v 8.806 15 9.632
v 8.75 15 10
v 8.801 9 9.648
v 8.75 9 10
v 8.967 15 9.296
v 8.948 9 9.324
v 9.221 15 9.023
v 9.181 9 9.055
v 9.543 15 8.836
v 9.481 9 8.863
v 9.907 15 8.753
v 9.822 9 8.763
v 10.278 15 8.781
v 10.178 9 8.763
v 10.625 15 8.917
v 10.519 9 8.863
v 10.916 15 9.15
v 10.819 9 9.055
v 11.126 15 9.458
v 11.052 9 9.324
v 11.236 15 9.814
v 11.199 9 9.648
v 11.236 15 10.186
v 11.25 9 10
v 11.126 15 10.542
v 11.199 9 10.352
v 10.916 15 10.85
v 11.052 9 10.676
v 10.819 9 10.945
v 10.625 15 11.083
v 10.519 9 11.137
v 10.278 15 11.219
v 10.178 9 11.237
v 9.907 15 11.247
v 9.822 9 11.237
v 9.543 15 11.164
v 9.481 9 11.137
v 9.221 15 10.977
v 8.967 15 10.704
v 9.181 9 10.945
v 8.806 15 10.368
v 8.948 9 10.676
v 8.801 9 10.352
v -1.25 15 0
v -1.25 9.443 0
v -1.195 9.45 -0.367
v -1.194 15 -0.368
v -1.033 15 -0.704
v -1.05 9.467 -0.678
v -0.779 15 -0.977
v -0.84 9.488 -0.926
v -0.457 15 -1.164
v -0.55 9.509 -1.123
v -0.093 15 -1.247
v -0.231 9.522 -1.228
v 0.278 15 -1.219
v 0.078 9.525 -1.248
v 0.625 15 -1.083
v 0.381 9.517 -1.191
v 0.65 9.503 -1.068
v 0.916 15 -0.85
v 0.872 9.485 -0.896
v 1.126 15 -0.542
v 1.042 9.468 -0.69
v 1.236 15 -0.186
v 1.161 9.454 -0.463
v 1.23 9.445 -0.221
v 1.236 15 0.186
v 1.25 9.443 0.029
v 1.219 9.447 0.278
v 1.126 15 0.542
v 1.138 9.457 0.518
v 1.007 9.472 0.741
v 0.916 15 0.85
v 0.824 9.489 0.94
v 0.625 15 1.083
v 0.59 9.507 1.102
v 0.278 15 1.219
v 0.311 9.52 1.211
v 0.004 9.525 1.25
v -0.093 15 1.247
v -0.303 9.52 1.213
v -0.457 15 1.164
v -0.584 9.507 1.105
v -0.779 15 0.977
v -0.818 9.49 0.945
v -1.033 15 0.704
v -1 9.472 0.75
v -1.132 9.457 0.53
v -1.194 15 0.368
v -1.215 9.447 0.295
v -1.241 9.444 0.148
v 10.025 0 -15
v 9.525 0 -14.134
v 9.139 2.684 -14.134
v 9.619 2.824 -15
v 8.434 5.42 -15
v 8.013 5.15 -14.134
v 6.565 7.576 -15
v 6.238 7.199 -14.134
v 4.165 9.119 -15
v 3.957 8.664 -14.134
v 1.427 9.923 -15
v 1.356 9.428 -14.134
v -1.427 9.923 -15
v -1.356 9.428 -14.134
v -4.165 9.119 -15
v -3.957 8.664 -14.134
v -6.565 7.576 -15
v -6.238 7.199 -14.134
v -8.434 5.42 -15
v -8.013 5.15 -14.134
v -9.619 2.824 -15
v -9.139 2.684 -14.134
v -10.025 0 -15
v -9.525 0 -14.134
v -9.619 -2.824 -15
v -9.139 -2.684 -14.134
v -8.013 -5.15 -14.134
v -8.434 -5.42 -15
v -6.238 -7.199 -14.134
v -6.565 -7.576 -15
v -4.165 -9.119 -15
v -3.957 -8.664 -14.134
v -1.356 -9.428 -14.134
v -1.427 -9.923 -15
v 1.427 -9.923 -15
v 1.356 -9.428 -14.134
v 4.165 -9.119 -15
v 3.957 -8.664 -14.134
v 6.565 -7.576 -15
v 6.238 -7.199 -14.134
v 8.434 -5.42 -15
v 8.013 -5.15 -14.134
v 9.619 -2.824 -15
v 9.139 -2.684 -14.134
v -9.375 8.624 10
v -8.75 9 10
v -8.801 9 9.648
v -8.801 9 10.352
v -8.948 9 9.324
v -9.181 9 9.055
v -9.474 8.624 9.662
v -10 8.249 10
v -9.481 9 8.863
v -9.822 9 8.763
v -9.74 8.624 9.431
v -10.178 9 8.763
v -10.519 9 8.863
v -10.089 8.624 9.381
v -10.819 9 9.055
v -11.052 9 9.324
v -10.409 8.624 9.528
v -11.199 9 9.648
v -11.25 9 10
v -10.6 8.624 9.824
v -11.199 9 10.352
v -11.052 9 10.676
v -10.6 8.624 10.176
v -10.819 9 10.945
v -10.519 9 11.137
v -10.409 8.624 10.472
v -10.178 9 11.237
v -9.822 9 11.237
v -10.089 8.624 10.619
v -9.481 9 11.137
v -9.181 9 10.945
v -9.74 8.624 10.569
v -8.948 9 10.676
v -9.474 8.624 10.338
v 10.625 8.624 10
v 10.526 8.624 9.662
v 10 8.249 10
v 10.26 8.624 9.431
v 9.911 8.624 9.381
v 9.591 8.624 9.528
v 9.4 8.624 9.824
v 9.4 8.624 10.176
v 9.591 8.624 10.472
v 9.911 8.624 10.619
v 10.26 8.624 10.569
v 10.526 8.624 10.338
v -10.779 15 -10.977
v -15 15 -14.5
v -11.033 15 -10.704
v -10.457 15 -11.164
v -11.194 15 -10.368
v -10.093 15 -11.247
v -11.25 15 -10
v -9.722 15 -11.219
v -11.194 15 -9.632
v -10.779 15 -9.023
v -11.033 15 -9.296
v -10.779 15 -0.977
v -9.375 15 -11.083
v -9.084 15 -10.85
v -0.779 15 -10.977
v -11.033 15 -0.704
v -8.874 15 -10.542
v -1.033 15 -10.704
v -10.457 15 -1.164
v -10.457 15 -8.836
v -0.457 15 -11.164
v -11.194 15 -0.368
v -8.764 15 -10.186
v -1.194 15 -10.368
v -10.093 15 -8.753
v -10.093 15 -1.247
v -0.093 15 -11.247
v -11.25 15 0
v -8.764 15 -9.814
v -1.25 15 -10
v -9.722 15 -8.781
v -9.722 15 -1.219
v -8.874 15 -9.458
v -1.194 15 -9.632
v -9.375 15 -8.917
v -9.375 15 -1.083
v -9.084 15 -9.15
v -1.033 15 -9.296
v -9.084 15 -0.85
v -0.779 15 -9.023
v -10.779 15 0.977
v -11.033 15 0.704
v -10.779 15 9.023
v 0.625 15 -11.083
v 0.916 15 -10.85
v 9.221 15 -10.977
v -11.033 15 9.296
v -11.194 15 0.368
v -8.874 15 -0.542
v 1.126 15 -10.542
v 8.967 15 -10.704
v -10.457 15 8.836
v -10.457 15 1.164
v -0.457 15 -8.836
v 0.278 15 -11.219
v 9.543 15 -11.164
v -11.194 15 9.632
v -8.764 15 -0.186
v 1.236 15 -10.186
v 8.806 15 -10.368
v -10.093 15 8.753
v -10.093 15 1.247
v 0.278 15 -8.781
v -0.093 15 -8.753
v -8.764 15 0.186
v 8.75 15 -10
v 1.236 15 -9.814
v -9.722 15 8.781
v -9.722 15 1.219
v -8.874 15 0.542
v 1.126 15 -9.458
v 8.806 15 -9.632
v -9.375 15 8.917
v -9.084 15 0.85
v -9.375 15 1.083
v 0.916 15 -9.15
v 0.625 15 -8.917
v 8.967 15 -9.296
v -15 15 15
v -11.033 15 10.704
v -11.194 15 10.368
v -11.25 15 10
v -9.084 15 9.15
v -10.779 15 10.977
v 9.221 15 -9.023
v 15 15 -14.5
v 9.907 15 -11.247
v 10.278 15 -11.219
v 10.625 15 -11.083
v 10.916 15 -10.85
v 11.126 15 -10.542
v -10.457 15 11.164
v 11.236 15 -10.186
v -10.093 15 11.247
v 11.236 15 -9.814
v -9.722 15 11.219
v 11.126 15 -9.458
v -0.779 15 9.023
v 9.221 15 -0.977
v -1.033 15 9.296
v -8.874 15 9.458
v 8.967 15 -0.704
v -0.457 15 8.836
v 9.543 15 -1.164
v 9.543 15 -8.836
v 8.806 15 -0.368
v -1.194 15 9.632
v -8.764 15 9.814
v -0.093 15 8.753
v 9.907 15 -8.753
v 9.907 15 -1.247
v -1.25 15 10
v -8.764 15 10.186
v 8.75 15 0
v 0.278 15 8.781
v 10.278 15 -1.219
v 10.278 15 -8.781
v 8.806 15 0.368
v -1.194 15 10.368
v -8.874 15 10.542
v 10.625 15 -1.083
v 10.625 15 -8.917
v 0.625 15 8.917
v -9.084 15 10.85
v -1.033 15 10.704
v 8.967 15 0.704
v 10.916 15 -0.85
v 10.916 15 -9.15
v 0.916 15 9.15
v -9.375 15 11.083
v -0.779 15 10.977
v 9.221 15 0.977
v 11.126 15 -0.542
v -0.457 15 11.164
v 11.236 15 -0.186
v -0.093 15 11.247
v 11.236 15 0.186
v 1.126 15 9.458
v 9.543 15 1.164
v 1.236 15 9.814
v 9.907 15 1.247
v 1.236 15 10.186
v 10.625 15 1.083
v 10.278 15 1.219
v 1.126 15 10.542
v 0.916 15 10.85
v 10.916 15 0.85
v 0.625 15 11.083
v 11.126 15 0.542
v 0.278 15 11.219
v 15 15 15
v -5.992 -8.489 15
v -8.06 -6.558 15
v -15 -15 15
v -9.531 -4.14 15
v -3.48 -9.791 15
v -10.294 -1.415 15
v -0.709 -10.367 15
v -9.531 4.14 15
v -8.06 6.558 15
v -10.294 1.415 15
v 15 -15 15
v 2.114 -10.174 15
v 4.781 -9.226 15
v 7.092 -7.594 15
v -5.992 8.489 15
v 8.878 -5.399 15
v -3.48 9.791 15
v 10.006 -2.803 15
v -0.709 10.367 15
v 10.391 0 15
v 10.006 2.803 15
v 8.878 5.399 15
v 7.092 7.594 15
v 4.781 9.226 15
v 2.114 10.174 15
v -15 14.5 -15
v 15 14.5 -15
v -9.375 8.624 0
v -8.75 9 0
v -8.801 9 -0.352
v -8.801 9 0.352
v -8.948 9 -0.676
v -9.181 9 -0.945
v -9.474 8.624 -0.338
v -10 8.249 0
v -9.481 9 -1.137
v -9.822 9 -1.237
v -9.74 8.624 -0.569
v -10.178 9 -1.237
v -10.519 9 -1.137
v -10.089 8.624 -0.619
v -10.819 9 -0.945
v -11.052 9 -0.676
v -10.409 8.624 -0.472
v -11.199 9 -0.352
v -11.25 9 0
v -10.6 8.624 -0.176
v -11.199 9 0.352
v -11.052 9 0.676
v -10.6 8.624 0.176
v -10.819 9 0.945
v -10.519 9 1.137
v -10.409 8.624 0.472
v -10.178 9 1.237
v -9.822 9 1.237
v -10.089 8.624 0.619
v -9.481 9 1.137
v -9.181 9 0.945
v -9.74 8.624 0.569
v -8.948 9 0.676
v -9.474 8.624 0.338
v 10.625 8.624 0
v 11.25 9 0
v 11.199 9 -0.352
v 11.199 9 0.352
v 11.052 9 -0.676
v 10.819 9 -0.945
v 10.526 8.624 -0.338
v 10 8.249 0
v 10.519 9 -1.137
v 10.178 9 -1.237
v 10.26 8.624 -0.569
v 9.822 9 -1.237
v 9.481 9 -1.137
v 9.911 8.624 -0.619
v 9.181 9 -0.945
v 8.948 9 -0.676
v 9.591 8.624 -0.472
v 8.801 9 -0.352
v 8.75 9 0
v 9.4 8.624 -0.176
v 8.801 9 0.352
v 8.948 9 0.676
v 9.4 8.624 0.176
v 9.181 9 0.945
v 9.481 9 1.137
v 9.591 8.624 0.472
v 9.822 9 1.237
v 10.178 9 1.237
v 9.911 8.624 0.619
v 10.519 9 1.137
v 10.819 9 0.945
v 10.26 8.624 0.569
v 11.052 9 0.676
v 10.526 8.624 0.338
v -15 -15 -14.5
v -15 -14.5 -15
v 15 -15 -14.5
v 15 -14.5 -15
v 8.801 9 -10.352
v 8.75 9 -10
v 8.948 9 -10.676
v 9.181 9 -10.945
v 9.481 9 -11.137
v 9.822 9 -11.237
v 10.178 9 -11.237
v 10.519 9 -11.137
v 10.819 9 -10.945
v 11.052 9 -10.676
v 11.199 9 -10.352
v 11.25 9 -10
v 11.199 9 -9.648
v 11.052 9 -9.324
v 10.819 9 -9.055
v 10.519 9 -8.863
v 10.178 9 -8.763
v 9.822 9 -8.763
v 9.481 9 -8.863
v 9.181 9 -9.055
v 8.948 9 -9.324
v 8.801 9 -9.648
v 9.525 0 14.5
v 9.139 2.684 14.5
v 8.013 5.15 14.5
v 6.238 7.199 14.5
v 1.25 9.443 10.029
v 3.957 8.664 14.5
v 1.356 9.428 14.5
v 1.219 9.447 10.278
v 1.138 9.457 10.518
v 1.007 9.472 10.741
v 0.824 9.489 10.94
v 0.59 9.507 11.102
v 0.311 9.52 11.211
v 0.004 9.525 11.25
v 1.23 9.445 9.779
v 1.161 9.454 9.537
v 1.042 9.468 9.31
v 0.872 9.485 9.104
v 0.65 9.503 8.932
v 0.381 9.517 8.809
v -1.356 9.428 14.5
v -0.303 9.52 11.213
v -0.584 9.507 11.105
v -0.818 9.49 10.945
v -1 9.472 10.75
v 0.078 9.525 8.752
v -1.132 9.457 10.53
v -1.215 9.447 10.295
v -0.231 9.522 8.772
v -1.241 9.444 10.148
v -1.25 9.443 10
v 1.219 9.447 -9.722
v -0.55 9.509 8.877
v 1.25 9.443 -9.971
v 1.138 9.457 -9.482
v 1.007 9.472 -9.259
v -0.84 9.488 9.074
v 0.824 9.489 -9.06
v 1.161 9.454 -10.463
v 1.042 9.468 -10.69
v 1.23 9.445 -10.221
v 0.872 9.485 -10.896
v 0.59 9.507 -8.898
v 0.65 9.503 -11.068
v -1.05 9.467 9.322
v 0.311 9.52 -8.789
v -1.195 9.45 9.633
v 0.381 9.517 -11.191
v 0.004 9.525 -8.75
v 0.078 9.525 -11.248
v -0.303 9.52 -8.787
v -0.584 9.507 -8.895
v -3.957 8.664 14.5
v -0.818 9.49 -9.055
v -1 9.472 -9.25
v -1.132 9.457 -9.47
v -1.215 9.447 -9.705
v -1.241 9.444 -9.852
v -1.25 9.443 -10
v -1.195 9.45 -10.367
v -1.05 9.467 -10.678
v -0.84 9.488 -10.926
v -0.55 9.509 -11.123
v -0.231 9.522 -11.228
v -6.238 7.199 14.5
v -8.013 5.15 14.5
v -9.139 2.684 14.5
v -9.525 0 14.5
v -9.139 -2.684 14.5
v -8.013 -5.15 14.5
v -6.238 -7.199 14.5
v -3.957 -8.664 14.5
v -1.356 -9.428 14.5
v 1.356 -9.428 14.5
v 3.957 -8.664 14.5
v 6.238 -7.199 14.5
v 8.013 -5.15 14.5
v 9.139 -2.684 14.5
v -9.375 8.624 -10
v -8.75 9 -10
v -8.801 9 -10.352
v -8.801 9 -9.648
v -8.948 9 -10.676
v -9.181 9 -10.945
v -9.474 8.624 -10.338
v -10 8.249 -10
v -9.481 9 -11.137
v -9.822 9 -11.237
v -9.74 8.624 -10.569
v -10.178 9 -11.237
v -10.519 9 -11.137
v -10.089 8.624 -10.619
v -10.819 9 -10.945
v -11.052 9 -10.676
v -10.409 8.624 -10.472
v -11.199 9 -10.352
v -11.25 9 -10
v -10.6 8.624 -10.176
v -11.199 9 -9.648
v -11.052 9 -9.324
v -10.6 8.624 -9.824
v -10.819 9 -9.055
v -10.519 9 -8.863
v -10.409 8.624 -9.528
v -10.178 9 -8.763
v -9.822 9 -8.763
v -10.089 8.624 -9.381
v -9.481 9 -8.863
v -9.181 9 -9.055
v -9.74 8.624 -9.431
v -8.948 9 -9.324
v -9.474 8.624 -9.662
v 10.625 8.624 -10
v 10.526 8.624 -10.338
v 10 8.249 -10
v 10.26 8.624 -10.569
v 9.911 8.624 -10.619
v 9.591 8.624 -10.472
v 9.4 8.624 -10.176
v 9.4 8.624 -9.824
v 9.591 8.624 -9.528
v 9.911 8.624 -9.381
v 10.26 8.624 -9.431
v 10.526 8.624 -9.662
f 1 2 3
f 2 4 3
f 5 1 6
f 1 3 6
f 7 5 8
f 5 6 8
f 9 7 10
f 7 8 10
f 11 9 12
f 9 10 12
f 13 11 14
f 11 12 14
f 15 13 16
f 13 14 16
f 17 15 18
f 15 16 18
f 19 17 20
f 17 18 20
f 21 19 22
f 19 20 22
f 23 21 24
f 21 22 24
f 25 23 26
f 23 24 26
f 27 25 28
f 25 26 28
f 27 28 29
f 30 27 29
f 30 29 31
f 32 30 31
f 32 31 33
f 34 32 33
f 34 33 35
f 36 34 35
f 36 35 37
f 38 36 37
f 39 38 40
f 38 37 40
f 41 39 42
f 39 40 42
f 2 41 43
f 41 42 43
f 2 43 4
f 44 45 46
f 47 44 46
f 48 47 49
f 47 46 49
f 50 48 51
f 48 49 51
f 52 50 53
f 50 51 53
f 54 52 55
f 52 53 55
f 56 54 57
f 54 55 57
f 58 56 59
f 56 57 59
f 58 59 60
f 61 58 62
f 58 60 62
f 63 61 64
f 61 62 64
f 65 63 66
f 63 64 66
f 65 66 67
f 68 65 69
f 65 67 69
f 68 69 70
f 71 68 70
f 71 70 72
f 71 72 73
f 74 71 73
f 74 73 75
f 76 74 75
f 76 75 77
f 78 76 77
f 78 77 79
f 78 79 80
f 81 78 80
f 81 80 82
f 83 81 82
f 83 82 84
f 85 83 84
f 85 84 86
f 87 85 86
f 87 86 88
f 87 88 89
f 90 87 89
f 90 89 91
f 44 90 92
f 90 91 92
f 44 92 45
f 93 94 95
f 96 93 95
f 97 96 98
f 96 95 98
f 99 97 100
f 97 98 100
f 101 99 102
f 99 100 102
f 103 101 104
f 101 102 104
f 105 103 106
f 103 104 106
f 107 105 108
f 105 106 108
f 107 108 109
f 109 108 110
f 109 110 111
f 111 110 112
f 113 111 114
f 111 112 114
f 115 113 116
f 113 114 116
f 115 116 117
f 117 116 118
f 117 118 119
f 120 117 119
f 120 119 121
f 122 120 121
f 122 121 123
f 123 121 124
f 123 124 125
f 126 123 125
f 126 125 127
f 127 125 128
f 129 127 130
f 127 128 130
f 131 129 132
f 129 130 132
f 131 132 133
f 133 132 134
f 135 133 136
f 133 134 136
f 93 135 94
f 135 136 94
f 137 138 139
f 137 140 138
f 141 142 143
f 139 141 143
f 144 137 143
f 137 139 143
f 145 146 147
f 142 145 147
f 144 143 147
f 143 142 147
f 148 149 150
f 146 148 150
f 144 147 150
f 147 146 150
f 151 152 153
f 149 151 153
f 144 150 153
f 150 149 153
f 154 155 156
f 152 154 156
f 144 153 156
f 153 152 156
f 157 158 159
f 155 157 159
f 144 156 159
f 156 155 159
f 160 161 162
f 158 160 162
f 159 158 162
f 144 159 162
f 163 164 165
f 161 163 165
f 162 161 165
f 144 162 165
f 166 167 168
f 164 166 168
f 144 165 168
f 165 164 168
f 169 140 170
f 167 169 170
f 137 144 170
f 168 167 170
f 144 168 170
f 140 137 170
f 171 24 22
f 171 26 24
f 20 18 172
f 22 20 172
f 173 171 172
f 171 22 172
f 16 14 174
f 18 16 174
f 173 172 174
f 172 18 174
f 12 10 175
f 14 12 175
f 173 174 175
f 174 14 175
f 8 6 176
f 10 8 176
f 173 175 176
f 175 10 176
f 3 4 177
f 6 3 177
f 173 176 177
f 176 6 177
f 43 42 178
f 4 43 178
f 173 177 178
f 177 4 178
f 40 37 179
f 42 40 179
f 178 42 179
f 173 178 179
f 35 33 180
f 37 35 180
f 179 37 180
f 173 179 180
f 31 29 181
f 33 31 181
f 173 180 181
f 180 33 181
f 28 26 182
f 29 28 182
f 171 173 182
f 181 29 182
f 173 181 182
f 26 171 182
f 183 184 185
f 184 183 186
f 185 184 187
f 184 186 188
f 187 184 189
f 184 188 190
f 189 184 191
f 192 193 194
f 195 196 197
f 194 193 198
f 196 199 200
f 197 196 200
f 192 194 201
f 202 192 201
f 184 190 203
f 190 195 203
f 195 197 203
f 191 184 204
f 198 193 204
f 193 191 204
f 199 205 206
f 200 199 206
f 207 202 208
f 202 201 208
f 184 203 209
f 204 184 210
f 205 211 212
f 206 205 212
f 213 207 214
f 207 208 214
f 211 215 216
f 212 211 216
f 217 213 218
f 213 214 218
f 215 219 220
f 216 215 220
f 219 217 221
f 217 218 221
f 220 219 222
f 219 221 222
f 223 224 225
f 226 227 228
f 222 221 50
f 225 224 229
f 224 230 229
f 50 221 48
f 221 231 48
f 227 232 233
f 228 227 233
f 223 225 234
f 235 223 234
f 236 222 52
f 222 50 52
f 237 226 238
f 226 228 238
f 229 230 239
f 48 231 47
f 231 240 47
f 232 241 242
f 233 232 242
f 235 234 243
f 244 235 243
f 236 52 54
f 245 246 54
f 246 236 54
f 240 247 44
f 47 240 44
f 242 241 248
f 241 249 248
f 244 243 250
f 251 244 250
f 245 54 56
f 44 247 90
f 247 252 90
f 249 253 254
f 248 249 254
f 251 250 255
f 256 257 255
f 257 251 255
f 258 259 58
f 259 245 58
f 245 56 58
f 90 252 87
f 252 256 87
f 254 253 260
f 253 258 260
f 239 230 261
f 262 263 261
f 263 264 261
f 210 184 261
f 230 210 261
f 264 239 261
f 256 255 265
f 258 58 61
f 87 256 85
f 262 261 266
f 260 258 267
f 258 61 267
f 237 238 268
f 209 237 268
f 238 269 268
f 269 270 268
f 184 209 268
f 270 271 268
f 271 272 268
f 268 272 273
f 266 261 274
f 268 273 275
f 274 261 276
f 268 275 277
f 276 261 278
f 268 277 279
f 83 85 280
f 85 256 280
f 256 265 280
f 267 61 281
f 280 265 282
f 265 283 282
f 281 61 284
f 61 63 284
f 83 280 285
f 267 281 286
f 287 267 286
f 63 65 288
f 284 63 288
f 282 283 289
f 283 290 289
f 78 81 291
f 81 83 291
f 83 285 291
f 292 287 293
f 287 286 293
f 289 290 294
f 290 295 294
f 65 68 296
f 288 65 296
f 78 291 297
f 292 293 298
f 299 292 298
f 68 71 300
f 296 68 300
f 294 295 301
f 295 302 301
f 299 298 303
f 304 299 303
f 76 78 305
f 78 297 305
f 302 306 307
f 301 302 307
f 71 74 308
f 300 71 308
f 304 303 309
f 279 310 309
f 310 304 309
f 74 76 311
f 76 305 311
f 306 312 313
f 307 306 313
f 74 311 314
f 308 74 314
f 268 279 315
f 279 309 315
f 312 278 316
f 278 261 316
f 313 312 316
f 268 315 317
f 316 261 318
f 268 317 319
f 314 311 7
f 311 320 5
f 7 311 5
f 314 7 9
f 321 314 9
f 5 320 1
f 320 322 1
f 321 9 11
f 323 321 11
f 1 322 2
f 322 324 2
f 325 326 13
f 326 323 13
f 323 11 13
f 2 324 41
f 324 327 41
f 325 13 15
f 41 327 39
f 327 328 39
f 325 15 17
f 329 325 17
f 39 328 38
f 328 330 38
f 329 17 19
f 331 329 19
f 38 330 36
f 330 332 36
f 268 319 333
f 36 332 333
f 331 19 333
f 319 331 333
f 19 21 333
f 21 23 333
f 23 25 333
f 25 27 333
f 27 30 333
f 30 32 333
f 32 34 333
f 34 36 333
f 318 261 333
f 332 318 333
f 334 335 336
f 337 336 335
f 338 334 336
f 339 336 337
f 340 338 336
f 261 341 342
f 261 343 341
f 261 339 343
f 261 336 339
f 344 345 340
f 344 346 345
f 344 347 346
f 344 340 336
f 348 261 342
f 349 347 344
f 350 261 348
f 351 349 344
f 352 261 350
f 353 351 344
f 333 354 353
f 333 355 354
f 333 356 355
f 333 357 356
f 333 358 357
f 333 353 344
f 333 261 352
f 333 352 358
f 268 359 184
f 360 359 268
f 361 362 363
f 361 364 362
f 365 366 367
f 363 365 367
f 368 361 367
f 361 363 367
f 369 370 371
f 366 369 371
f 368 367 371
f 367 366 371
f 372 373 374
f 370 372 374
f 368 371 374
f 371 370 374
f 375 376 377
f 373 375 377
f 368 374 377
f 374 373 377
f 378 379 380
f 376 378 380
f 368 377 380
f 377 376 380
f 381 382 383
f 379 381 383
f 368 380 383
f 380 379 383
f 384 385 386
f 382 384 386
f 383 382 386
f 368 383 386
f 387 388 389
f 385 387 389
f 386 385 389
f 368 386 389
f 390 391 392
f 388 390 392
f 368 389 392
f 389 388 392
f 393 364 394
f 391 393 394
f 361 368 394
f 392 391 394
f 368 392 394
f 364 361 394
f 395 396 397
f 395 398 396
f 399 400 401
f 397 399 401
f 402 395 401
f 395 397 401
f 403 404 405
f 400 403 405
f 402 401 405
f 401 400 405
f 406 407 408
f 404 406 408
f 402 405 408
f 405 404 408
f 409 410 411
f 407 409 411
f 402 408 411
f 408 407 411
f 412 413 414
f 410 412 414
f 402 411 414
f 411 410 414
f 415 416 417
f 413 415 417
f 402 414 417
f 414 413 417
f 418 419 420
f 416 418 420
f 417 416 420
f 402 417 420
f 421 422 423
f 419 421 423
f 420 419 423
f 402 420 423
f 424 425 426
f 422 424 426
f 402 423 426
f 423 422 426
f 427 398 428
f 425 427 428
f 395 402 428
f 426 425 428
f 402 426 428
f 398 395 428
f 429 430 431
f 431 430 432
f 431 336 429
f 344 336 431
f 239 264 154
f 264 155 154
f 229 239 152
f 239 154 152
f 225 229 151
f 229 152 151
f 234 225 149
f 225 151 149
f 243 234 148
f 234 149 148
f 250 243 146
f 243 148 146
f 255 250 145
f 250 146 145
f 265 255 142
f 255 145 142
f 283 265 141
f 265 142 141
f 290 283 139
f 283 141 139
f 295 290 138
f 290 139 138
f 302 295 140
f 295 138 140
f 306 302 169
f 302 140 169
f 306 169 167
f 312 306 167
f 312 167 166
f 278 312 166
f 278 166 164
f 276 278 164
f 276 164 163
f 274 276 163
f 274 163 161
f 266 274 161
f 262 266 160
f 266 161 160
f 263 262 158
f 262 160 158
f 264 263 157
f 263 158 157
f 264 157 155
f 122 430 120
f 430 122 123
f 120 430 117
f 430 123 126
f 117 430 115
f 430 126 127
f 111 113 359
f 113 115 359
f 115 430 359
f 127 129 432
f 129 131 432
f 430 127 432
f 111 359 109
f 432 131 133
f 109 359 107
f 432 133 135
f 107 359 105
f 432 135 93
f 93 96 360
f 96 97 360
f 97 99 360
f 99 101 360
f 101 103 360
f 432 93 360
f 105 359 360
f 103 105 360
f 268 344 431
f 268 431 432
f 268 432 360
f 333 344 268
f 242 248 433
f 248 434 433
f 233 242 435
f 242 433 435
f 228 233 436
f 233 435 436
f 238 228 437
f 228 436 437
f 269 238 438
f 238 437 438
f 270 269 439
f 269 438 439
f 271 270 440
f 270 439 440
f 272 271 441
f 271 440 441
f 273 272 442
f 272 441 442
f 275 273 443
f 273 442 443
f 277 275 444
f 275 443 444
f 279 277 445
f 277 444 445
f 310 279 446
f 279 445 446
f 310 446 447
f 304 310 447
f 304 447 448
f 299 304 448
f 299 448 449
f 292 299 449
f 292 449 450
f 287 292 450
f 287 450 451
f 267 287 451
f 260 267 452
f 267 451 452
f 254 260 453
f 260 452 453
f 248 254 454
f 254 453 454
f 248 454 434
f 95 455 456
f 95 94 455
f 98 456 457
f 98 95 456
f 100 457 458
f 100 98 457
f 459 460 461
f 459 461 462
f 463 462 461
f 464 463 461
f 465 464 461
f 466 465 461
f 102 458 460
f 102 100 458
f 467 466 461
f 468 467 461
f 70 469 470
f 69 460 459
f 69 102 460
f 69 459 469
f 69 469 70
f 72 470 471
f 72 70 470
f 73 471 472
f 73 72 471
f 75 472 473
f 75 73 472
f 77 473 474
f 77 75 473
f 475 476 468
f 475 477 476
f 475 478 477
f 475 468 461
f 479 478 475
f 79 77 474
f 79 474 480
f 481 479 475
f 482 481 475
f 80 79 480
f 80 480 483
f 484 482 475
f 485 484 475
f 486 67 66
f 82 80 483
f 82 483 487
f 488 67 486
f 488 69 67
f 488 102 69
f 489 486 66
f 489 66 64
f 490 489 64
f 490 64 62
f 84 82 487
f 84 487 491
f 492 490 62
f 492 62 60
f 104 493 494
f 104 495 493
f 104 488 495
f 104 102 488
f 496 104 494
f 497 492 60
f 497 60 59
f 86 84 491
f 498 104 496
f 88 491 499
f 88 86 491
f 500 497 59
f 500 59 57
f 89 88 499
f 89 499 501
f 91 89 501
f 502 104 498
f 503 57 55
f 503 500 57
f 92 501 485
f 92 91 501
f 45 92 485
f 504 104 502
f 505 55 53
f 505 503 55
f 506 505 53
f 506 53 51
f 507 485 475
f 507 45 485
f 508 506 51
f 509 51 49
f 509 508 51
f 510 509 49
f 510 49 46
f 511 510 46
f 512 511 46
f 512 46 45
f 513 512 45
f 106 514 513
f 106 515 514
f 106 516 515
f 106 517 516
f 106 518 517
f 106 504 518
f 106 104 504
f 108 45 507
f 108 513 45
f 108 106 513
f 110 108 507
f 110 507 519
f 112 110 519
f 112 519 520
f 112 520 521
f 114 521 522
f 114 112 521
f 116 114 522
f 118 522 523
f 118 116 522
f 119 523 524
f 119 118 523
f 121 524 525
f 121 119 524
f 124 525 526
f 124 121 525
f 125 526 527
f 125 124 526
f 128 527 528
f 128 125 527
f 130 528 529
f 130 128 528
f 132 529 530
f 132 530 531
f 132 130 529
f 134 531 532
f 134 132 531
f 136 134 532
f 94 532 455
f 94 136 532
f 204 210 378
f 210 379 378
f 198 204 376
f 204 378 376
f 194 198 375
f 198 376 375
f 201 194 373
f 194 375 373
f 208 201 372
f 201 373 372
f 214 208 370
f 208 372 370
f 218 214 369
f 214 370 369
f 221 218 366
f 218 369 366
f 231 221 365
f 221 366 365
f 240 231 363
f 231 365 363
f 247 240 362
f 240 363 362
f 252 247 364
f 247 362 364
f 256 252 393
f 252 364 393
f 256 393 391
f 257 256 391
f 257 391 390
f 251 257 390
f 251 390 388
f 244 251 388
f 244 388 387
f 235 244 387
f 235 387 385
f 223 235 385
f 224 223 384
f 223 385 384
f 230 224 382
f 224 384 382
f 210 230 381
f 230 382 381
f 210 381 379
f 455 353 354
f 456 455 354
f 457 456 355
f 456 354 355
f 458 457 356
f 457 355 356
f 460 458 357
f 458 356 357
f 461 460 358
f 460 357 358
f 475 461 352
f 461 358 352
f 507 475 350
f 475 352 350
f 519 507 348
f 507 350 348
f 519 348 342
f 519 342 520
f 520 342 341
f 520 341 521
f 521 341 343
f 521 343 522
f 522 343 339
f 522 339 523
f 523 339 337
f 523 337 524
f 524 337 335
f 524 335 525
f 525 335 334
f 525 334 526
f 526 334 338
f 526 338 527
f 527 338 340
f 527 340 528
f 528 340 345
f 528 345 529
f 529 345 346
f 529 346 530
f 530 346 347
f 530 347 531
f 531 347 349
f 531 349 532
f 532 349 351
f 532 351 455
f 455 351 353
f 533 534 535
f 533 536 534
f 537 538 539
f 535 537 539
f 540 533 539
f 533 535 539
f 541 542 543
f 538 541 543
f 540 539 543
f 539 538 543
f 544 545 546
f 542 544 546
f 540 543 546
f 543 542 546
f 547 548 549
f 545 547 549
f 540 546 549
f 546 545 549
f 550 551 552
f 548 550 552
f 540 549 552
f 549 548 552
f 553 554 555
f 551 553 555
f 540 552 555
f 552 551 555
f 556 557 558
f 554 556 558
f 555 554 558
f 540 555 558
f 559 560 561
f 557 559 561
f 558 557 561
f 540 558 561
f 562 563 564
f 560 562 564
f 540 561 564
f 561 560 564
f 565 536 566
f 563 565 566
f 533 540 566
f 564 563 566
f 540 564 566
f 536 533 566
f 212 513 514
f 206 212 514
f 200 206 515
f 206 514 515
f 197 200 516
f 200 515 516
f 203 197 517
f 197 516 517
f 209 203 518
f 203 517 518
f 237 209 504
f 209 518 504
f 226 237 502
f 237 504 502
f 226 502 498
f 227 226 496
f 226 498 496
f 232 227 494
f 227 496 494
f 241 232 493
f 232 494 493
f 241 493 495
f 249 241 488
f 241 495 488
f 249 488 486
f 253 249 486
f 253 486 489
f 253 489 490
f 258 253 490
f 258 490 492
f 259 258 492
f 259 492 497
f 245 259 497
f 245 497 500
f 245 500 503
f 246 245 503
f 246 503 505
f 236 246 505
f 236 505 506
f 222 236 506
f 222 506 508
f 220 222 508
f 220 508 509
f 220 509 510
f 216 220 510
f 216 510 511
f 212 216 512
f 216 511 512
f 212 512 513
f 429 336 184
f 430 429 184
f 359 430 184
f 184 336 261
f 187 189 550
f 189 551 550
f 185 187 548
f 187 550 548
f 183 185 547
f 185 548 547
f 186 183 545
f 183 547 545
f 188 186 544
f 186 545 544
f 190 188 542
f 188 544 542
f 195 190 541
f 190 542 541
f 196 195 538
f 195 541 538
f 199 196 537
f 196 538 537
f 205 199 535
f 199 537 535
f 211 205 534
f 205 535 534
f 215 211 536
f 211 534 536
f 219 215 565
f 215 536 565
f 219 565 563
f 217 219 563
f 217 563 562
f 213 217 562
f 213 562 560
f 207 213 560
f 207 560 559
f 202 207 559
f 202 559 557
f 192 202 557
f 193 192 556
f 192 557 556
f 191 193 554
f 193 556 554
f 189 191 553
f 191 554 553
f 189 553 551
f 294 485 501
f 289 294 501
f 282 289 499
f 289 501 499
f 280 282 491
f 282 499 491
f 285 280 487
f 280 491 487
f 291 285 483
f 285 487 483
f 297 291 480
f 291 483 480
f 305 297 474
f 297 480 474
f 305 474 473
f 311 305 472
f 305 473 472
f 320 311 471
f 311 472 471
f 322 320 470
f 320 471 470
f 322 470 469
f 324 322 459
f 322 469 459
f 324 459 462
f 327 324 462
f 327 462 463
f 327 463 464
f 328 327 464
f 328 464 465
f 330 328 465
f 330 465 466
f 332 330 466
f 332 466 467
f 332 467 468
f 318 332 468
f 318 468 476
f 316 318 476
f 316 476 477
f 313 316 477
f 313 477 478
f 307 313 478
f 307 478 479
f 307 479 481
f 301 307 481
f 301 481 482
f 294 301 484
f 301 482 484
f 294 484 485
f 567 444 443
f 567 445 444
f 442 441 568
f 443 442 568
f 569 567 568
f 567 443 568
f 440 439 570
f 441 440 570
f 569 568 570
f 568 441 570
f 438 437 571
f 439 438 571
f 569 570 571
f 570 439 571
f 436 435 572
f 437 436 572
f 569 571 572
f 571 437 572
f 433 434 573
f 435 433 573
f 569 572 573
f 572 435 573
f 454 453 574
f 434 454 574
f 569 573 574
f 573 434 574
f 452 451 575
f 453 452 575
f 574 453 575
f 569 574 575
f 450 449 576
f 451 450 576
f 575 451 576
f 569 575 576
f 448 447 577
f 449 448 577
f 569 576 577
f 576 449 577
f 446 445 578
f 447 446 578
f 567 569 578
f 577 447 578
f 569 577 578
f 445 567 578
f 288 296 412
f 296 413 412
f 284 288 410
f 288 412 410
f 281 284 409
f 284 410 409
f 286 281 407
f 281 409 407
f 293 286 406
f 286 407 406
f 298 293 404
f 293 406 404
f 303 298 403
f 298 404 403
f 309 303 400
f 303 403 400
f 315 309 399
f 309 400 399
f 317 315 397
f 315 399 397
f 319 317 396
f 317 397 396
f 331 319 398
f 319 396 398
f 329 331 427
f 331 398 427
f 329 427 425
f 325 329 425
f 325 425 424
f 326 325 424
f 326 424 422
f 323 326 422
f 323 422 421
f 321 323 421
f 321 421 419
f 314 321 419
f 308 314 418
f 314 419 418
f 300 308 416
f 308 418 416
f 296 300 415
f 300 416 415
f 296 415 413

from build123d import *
from OCP.BRepFilletAPI import BRepFilletAPI_MakeChamfer

# Parameters (mm, degrees)
SKETCH1_W                 = 30
SKETCH1_H                 = 30
SKETCH1_R                 = 9.525
BOSS_EXTRUDE1_DEPTH       = 15
CHAMFER2_SIZE             = 0.5
CHAMFER2_SIZE2            = 0.866025404
CHAMFER3_SIZE             = 0.5
M3X0_5_TAPPED_HOLE1_D     = 2.5
M3X0_5_TAPPED_HOLE1_DEPTH = 6
M3X0_5_TAPPED_HOLE1_TIP   = 0.751075774


with BuildPart() as part:
    # Sketch1 → Boss-Extrude1 (new, symmetric)
    with BuildSketch(Plane.XY):
        Rectangle(SKETCH1_W, SKETCH1_H)
        Circle(SKETCH1_R, mode=Mode.SUBTRACT)
    extrude(amount=BOSS_EXTRUDE1_DEPTH, both=True)

    # Chamfer2: one chamfer whose edges measure the first distance from different faces: ONE call of the kernel's chamfer builder (chamfer() names one face for all edges)
    chamfer2_edges_1 = [part.edges().sort_by_distance(p)[0] for p in [
        (-9.525, 0, -15),
    ]]
    chamfer2_side_1 = [part.faces().sort_by_distance(p)[0] for p in [
        (0, -14.575735931, -15),
    ]]
    chamfer2_edges_2 = [part.edges().sort_by_distance(p)[0] for p in [
        (-9.525, 0, 15),
    ]]
    chamfer2_side_2 = [part.faces().sort_by_distance(p)[0] for p in [
        (-9.525, 0, 0),
    ]]
    chamfer2 = BRepFilletAPI_MakeChamfer(part.part.solid().wrapped)
    for e in chamfer2_edges_1:
        chamfer2.Add(CHAMFER2_SIZE, CHAMFER2_SIZE2, e.wrapped, chamfer2_side_1[0].wrapped)  # the first distance lies on this face
    for e in chamfer2_edges_2:
        chamfer2.Add(CHAMFER2_SIZE, CHAMFER2_SIZE2, e.wrapped, chamfer2_side_2[0].wrapped)  # the first distance lies on this face
    add(Compound.cast(chamfer2.Shape()), mode=Mode.REPLACE)

    # Chamfer3
    chamfer3_edges = [part.edges().sort_by_distance(p)[0] for p in [
        (0, 15, -15),
        (0, -15, -15),
    ]]
    chamfer(chamfer3_edges, length=CHAMFER3_SIZE)

    # M3x0.5 Tapped Hole1
    with Locations(Plane(origin=(0, 15, 0), x_dir=(1, 0, 0), z_dir=(0, 1, 0))):
        with Locations((-10, 0), (10, 0), (0, 0), (-10, 10), (-10, -10), (10, 10), (10, -10), (0, 10), (0, -10)):
            Hole(M3X0_5_TAPPED_HOLE1_D / 2, depth=M3X0_5_TAPPED_HOLE1_DEPTH)
            with Locations((0, 0, -(M3X0_5_TAPPED_HOLE1_DEPTH + M3X0_5_TAPPED_HOLE1_TIP / 2))):  # 118° drill point
                Cone(0, M3X0_5_TAPPED_HOLE1_D / 2, M3X0_5_TAPPED_HOLE1_TIP, mode=Mode.SUBTRACT)


solid = part.part
